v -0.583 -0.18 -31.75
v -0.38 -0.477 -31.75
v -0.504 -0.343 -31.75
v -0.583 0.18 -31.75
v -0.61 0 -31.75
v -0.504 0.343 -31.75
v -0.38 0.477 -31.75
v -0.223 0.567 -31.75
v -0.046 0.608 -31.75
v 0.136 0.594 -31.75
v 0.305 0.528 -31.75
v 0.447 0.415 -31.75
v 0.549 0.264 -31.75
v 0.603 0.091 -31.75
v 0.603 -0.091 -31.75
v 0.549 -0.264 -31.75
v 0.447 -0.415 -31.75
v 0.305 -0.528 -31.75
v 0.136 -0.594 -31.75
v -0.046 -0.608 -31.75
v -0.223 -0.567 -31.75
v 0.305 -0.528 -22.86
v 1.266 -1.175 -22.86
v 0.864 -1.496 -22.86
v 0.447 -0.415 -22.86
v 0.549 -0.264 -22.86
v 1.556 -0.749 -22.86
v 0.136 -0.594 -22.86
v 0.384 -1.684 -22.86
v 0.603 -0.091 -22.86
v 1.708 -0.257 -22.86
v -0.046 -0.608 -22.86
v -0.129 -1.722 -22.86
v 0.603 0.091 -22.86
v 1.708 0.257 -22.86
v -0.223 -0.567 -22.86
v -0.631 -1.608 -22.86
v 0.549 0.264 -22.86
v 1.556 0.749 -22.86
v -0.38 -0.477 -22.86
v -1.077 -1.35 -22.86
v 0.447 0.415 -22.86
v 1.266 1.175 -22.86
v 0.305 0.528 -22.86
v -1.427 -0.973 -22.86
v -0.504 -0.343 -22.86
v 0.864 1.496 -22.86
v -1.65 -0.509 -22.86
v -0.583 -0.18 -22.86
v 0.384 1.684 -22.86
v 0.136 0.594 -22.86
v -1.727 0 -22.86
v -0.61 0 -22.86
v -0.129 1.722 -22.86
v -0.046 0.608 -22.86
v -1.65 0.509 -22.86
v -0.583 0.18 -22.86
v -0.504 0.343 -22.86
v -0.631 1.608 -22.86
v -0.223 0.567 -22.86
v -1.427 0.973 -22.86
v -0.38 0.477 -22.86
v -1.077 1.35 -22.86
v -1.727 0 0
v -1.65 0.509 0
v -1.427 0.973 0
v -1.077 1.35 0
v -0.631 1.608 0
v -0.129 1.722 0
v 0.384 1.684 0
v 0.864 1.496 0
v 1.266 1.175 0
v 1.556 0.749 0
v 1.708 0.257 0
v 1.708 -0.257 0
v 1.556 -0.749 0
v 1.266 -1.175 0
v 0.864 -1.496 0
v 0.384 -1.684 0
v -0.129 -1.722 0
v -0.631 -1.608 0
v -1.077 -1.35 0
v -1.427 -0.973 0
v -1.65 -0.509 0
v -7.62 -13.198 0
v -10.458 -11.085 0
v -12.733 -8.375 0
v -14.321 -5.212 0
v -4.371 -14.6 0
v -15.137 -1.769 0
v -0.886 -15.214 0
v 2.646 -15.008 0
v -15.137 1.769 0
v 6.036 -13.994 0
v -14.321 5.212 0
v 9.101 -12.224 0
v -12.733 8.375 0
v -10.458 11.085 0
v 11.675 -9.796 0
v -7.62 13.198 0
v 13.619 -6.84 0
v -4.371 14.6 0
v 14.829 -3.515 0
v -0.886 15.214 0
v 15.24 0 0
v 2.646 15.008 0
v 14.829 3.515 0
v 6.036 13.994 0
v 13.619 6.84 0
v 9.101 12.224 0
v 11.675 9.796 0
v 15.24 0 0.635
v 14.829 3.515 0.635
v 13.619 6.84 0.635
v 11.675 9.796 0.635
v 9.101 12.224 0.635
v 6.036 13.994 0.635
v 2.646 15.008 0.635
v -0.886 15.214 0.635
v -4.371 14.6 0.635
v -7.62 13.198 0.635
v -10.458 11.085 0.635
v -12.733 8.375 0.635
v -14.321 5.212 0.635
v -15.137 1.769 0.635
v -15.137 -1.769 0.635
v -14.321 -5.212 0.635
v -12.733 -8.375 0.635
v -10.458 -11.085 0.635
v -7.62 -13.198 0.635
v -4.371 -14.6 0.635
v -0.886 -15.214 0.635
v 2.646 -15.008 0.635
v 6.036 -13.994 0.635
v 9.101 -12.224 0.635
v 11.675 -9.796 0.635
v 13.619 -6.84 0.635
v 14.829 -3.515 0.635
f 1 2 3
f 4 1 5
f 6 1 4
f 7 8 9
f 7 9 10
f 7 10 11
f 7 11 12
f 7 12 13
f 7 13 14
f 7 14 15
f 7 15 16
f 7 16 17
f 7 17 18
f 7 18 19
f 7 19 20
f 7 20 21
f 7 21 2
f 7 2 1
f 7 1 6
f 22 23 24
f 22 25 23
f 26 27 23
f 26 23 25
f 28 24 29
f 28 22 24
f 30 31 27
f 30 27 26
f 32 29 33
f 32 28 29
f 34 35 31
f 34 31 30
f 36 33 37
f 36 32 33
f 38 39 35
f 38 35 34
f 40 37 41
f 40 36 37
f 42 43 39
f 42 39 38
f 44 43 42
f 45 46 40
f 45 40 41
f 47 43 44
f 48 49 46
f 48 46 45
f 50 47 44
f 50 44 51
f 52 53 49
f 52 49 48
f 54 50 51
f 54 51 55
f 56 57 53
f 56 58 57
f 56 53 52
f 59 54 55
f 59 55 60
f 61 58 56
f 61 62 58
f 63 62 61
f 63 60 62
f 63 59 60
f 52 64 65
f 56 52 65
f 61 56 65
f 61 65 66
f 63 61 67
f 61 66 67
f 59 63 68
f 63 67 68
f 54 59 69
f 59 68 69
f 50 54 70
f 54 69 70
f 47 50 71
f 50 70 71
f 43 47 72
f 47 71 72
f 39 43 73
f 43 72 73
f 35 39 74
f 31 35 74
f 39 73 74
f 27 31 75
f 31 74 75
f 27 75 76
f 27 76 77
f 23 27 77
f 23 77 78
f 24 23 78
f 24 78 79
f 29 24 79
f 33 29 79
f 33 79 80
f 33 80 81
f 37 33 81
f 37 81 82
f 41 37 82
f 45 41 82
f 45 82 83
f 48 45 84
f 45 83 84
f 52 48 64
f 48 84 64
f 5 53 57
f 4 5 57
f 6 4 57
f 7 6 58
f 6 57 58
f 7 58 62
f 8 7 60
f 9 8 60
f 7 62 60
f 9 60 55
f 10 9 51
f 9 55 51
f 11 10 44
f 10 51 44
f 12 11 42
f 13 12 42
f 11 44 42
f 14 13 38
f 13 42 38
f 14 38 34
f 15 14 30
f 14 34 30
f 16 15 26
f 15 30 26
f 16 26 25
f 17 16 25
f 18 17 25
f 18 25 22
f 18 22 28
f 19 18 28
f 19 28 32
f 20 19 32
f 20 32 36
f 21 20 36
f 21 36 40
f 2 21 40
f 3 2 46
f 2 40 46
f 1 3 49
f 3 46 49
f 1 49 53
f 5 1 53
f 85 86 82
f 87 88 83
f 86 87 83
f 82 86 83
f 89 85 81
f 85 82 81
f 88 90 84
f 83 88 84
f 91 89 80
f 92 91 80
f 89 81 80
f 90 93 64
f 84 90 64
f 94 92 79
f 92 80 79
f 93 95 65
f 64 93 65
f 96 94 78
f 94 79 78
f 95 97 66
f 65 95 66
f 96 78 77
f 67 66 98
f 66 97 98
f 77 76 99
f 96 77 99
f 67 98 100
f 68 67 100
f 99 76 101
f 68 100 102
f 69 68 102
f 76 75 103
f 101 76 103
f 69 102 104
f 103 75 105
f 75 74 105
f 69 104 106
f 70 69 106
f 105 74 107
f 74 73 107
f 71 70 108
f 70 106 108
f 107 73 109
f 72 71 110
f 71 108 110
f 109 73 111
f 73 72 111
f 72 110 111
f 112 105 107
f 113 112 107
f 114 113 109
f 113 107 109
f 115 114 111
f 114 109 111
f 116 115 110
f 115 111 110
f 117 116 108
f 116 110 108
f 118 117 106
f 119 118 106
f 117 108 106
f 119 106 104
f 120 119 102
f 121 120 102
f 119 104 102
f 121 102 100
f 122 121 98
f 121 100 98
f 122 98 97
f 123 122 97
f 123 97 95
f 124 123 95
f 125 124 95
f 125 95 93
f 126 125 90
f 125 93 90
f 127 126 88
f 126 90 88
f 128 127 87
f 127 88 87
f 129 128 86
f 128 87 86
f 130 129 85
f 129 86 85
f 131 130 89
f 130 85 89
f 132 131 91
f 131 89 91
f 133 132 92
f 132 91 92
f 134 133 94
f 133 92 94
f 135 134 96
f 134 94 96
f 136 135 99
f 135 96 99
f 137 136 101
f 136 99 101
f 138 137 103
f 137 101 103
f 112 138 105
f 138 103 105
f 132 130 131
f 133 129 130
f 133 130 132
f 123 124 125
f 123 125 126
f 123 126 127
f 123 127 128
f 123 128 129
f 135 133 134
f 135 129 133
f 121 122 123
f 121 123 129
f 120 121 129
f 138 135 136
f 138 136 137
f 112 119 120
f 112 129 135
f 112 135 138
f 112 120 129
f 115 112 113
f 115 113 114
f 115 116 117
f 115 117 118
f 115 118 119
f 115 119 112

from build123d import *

# Parameters (mm, degrees)
SKETCH1_R           = 15.24
BOSS_EXTRUDE1_DEPTH = 0.635
SKETCH2_R           = 1.7272
BOSS_EXTRUDE2_DEPTH = 22.86
SKETCH3_R           = 0.6096
BOSS_EXTRUDE3_DEPTH = 8.89


with BuildPart() as part:
    # Sketch1 → Boss-Extrude1 (new body)
    with BuildSketch(Plane.XY):
        Circle(SKETCH1_R)
    extrude(amount=BOSS_EXTRUDE1_DEPTH)

    # Sketch2 → Boss-Extrude2 (add)
    with BuildSketch(Plane(origin=(0, 0, 0), x_dir=(-1, 0, 0), z_dir=(0, 0, -1))):
        Circle(SKETCH2_R)
    extrude(amount=BOSS_EXTRUDE2_DEPTH)

    # Sketch3 → Boss-Extrude3 (add)
    with BuildSketch(Plane(origin=(0, 0, -22.86), x_dir=(-1, 0, 0), z_dir=(0, 0, -1))):
        Circle(SKETCH3_R)
    extrude(amount=BOSS_EXTRUDE3_DEPTH)


solid = part.part
